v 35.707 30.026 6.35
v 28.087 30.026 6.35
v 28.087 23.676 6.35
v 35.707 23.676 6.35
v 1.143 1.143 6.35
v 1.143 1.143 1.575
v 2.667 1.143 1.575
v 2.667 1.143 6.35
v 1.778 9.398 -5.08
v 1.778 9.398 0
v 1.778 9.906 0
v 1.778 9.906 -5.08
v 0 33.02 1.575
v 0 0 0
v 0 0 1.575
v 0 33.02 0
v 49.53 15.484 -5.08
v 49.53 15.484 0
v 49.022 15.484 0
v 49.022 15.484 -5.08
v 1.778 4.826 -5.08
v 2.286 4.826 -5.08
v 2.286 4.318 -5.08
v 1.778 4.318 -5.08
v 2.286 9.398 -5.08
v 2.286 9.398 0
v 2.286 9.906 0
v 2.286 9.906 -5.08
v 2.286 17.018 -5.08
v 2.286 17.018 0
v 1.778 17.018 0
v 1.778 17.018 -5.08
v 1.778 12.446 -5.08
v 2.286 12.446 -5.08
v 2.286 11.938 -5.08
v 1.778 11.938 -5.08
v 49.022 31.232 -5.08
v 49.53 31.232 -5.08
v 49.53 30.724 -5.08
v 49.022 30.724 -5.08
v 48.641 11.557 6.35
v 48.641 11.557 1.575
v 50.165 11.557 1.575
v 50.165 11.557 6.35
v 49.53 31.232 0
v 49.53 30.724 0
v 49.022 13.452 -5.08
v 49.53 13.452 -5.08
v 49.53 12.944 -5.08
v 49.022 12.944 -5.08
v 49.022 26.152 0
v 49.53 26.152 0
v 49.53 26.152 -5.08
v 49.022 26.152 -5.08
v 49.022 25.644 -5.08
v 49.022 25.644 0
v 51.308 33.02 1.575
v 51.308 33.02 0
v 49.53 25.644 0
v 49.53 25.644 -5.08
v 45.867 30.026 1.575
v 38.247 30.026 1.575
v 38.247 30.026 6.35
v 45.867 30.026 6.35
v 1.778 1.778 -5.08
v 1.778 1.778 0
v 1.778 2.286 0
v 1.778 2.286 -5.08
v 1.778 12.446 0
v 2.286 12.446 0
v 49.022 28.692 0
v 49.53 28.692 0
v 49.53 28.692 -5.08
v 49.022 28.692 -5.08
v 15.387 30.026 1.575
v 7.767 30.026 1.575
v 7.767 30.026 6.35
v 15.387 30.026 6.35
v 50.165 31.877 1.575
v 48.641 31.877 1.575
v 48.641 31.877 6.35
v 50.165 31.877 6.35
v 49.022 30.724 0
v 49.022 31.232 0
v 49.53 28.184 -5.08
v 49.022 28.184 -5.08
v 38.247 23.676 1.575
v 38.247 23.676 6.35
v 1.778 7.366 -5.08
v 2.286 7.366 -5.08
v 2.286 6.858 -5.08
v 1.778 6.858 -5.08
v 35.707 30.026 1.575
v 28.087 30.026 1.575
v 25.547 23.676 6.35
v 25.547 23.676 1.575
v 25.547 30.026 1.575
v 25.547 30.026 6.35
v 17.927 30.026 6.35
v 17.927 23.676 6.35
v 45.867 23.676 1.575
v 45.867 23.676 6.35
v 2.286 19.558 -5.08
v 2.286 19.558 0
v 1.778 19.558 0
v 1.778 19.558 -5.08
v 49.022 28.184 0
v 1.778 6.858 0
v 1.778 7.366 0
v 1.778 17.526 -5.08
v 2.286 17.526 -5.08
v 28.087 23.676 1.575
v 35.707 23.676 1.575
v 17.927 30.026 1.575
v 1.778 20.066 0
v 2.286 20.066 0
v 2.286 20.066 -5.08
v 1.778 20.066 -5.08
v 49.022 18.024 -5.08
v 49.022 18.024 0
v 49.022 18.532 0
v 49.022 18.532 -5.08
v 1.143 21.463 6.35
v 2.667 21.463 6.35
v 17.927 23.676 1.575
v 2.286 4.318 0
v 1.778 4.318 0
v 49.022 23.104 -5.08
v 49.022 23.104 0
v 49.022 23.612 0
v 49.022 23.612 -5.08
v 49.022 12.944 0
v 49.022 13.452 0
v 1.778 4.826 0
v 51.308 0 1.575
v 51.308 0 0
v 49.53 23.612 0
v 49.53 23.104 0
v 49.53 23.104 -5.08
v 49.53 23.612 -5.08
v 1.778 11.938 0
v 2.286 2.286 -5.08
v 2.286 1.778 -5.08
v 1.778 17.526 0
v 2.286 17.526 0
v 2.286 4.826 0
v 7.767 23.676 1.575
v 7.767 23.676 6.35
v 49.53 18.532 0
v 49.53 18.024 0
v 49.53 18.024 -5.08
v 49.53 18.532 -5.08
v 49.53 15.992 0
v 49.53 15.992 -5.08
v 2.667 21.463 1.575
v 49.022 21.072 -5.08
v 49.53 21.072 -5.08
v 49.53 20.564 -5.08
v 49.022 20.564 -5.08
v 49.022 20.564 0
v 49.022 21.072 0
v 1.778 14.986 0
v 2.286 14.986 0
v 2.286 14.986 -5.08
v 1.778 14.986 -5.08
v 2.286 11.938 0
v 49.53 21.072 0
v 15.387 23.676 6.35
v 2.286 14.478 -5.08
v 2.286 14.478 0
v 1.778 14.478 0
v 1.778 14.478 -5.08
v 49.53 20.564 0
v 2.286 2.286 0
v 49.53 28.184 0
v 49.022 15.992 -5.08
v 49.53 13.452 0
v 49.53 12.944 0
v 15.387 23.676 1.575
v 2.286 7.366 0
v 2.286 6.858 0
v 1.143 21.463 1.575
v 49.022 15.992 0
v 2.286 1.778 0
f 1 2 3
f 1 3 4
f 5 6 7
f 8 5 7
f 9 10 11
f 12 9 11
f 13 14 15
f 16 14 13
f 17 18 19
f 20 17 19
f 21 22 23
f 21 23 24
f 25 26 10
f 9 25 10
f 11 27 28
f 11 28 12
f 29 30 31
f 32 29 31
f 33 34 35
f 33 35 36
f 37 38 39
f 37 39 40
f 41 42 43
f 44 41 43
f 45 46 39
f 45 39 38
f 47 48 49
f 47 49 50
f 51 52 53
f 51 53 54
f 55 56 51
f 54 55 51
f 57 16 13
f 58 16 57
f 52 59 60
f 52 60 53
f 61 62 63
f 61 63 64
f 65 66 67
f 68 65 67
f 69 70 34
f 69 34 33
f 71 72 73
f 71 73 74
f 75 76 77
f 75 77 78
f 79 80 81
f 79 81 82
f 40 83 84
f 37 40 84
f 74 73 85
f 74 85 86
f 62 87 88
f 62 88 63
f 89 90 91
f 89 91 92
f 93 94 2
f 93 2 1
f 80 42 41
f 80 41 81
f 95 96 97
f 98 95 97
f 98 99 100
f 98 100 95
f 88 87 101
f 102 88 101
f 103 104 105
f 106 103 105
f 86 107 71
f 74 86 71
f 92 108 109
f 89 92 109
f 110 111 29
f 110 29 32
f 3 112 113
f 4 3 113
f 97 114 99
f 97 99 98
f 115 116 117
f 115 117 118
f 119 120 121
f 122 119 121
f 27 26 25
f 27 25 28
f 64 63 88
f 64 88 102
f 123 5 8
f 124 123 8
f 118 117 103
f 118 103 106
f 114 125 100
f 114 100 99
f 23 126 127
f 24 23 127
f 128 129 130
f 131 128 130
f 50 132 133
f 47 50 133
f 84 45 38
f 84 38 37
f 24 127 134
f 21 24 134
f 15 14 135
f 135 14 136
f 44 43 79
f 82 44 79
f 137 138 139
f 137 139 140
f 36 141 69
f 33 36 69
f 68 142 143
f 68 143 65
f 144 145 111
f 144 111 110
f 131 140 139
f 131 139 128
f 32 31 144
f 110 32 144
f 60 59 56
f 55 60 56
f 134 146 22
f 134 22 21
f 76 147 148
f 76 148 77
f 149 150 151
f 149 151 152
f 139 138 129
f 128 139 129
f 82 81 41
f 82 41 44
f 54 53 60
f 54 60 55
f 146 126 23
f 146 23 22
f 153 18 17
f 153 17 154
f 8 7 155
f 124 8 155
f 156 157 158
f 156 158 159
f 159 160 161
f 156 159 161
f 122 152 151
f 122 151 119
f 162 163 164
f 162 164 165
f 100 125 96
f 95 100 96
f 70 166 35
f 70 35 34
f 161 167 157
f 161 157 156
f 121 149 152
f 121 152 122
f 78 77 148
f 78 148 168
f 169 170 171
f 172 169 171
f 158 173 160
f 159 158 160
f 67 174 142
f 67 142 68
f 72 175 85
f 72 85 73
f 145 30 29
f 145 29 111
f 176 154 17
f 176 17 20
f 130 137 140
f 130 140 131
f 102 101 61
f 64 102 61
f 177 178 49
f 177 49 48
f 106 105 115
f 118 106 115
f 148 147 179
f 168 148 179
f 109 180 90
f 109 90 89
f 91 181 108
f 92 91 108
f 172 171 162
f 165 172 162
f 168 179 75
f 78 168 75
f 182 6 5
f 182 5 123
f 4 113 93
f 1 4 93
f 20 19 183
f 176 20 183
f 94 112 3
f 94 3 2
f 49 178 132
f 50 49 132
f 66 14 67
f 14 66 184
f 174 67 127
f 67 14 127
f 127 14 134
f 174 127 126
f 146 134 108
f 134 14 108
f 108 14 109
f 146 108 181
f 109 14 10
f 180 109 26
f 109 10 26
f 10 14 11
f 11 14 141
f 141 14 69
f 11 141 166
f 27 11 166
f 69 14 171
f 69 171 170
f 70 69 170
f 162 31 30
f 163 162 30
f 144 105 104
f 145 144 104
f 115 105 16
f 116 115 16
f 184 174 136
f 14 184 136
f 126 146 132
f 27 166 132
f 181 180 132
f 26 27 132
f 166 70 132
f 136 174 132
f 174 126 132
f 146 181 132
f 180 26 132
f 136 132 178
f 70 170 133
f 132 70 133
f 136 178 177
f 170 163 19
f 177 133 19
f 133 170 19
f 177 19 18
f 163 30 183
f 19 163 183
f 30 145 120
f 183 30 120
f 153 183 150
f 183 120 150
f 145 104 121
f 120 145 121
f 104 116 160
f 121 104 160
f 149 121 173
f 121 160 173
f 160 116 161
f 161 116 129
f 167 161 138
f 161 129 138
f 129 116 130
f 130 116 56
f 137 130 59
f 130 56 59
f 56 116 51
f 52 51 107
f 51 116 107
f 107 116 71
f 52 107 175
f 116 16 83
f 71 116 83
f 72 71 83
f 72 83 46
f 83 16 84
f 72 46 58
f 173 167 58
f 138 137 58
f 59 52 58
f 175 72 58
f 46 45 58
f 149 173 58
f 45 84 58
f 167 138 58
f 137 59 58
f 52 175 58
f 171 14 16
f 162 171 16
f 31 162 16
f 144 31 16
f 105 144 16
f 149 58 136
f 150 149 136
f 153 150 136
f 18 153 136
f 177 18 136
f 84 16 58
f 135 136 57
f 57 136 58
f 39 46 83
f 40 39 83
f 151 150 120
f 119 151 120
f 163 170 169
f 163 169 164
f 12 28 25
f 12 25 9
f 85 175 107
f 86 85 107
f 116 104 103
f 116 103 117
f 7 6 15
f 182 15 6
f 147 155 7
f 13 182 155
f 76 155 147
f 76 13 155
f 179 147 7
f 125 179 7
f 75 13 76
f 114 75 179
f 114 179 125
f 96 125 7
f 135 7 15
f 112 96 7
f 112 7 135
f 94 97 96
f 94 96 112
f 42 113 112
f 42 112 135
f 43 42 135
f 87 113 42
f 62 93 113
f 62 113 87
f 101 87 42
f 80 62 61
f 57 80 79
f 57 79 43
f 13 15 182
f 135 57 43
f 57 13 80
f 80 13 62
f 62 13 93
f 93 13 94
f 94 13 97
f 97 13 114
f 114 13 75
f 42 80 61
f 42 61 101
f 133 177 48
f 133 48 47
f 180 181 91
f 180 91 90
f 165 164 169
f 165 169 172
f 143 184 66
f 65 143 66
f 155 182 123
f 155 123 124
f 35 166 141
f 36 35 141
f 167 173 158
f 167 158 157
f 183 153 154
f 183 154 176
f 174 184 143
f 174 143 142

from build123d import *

# Parameters (mm, degrees)
SKETCH1_W           = 51.308
SKETCH1_H           = 33.02
BOSS_EXTRUDE1_DEPTH = 1.5748
SKETCH2_W           = 1.524
SKETCH2_H           = 20.32
BOSS_EXTRUDE2_DEPTH = 6.35
SKETCH3_W           = 7.62
SKETCH3_H           = 6.35
BOSS_EXTRUDE3_DEPTH = 6.35
LPATTERN2_COUNT     = 4
LPATTERN2_PITCH     = 10.16
SKETCH6_W           = 0.508
SKETCH6_H           = 0.508
BOSS_EXTRUDE4_DEPTH = 5.08
LPATTERN3_COUNT     = 8
LPATTERN3_PITCH     = 2.54
SKETCH7_W           = 0.508
SKETCH7_H           = 0.508
BOSS_EXTRUDE5_DEPTH = 5.08
LPATTERN4_COUNT     = 8
LPATTERN4_PITCH     = 2.54


with BuildPart() as part:
    # Sketch1 → Boss-Extrude1 (new body)
    with BuildSketch(Plane.XY):
        with Locations((25.654, 16.51)):
            Rectangle(SKETCH1_W, SKETCH1_H)
    extrude(amount=BOSS_EXTRUDE1_DEPTH)

    # Sketch2 → Boss-Extrude2 (add)
    with BuildSketch(Plane.XY):
        with Locations((49.403, 21.717)):
            Rectangle(SKETCH2_W, SKETCH2_H)
        with Locations((1.905, 11.303)):
            Rectangle(SKETCH2_W, SKETCH2_H)
    extrude(amount=BOSS_EXTRUDE2_DEPTH)

    # Sketch3 → Boss-Extrude3 (add)
    with BuildSketch(Plane.XY):
        with Locations((11.577275474, 26.851190856)):
            Rectangle(SKETCH3_W, SKETCH3_H)
    boss_extrude3 = extrude(amount=BOSS_EXTRUDE3_DEPTH)

    # LPattern2: Boss-Extrude3 ×4
    with Locations(*[(i * LPATTERN2_PITCH, 0, 0) for i in range(1, LPATTERN2_COUNT)]):
        add(boss_extrude3)

    # Sketch6 → Boss-Extrude4 (add)
    with BuildSketch(Plane(origin=(0, 0, 0), x_dir=(-1, 0, 0), z_dir=(0, 0, -1))):
        with Locations((-49.276, 30.978319105)):
            Rectangle(SKETCH6_W, SKETCH6_H)
    boss_extrude4 = extrude(amount=BOSS_EXTRUDE4_DEPTH)

    # LPattern3: Boss-Extrude4 ×8
    with Locations(*[(0, -i * LPATTERN3_PITCH, 0) for i in range(1, LPATTERN3_COUNT)]):
        add(boss_extrude4)

    # Sketch7 → Boss-Extrude5 (add)
    with BuildSketch(Plane(origin=(0, 0, 0), x_dir=(-1, 0, 0), z_dir=(0, 0, -1))):
        with Locations((-2.032, 2.032)):
            Rectangle(SKETCH7_W, SKETCH7_H)
    boss_extrude5 = extrude(amount=BOSS_EXTRUDE5_DEPTH)

    # LPattern4: Boss-Extrude5 ×8
    with Locations(*[(0, i * LPATTERN4_PITCH, 0) for i in range(1, LPATTERN4_COUNT)]):
        add(boss_extrude5)


solid = part.part
